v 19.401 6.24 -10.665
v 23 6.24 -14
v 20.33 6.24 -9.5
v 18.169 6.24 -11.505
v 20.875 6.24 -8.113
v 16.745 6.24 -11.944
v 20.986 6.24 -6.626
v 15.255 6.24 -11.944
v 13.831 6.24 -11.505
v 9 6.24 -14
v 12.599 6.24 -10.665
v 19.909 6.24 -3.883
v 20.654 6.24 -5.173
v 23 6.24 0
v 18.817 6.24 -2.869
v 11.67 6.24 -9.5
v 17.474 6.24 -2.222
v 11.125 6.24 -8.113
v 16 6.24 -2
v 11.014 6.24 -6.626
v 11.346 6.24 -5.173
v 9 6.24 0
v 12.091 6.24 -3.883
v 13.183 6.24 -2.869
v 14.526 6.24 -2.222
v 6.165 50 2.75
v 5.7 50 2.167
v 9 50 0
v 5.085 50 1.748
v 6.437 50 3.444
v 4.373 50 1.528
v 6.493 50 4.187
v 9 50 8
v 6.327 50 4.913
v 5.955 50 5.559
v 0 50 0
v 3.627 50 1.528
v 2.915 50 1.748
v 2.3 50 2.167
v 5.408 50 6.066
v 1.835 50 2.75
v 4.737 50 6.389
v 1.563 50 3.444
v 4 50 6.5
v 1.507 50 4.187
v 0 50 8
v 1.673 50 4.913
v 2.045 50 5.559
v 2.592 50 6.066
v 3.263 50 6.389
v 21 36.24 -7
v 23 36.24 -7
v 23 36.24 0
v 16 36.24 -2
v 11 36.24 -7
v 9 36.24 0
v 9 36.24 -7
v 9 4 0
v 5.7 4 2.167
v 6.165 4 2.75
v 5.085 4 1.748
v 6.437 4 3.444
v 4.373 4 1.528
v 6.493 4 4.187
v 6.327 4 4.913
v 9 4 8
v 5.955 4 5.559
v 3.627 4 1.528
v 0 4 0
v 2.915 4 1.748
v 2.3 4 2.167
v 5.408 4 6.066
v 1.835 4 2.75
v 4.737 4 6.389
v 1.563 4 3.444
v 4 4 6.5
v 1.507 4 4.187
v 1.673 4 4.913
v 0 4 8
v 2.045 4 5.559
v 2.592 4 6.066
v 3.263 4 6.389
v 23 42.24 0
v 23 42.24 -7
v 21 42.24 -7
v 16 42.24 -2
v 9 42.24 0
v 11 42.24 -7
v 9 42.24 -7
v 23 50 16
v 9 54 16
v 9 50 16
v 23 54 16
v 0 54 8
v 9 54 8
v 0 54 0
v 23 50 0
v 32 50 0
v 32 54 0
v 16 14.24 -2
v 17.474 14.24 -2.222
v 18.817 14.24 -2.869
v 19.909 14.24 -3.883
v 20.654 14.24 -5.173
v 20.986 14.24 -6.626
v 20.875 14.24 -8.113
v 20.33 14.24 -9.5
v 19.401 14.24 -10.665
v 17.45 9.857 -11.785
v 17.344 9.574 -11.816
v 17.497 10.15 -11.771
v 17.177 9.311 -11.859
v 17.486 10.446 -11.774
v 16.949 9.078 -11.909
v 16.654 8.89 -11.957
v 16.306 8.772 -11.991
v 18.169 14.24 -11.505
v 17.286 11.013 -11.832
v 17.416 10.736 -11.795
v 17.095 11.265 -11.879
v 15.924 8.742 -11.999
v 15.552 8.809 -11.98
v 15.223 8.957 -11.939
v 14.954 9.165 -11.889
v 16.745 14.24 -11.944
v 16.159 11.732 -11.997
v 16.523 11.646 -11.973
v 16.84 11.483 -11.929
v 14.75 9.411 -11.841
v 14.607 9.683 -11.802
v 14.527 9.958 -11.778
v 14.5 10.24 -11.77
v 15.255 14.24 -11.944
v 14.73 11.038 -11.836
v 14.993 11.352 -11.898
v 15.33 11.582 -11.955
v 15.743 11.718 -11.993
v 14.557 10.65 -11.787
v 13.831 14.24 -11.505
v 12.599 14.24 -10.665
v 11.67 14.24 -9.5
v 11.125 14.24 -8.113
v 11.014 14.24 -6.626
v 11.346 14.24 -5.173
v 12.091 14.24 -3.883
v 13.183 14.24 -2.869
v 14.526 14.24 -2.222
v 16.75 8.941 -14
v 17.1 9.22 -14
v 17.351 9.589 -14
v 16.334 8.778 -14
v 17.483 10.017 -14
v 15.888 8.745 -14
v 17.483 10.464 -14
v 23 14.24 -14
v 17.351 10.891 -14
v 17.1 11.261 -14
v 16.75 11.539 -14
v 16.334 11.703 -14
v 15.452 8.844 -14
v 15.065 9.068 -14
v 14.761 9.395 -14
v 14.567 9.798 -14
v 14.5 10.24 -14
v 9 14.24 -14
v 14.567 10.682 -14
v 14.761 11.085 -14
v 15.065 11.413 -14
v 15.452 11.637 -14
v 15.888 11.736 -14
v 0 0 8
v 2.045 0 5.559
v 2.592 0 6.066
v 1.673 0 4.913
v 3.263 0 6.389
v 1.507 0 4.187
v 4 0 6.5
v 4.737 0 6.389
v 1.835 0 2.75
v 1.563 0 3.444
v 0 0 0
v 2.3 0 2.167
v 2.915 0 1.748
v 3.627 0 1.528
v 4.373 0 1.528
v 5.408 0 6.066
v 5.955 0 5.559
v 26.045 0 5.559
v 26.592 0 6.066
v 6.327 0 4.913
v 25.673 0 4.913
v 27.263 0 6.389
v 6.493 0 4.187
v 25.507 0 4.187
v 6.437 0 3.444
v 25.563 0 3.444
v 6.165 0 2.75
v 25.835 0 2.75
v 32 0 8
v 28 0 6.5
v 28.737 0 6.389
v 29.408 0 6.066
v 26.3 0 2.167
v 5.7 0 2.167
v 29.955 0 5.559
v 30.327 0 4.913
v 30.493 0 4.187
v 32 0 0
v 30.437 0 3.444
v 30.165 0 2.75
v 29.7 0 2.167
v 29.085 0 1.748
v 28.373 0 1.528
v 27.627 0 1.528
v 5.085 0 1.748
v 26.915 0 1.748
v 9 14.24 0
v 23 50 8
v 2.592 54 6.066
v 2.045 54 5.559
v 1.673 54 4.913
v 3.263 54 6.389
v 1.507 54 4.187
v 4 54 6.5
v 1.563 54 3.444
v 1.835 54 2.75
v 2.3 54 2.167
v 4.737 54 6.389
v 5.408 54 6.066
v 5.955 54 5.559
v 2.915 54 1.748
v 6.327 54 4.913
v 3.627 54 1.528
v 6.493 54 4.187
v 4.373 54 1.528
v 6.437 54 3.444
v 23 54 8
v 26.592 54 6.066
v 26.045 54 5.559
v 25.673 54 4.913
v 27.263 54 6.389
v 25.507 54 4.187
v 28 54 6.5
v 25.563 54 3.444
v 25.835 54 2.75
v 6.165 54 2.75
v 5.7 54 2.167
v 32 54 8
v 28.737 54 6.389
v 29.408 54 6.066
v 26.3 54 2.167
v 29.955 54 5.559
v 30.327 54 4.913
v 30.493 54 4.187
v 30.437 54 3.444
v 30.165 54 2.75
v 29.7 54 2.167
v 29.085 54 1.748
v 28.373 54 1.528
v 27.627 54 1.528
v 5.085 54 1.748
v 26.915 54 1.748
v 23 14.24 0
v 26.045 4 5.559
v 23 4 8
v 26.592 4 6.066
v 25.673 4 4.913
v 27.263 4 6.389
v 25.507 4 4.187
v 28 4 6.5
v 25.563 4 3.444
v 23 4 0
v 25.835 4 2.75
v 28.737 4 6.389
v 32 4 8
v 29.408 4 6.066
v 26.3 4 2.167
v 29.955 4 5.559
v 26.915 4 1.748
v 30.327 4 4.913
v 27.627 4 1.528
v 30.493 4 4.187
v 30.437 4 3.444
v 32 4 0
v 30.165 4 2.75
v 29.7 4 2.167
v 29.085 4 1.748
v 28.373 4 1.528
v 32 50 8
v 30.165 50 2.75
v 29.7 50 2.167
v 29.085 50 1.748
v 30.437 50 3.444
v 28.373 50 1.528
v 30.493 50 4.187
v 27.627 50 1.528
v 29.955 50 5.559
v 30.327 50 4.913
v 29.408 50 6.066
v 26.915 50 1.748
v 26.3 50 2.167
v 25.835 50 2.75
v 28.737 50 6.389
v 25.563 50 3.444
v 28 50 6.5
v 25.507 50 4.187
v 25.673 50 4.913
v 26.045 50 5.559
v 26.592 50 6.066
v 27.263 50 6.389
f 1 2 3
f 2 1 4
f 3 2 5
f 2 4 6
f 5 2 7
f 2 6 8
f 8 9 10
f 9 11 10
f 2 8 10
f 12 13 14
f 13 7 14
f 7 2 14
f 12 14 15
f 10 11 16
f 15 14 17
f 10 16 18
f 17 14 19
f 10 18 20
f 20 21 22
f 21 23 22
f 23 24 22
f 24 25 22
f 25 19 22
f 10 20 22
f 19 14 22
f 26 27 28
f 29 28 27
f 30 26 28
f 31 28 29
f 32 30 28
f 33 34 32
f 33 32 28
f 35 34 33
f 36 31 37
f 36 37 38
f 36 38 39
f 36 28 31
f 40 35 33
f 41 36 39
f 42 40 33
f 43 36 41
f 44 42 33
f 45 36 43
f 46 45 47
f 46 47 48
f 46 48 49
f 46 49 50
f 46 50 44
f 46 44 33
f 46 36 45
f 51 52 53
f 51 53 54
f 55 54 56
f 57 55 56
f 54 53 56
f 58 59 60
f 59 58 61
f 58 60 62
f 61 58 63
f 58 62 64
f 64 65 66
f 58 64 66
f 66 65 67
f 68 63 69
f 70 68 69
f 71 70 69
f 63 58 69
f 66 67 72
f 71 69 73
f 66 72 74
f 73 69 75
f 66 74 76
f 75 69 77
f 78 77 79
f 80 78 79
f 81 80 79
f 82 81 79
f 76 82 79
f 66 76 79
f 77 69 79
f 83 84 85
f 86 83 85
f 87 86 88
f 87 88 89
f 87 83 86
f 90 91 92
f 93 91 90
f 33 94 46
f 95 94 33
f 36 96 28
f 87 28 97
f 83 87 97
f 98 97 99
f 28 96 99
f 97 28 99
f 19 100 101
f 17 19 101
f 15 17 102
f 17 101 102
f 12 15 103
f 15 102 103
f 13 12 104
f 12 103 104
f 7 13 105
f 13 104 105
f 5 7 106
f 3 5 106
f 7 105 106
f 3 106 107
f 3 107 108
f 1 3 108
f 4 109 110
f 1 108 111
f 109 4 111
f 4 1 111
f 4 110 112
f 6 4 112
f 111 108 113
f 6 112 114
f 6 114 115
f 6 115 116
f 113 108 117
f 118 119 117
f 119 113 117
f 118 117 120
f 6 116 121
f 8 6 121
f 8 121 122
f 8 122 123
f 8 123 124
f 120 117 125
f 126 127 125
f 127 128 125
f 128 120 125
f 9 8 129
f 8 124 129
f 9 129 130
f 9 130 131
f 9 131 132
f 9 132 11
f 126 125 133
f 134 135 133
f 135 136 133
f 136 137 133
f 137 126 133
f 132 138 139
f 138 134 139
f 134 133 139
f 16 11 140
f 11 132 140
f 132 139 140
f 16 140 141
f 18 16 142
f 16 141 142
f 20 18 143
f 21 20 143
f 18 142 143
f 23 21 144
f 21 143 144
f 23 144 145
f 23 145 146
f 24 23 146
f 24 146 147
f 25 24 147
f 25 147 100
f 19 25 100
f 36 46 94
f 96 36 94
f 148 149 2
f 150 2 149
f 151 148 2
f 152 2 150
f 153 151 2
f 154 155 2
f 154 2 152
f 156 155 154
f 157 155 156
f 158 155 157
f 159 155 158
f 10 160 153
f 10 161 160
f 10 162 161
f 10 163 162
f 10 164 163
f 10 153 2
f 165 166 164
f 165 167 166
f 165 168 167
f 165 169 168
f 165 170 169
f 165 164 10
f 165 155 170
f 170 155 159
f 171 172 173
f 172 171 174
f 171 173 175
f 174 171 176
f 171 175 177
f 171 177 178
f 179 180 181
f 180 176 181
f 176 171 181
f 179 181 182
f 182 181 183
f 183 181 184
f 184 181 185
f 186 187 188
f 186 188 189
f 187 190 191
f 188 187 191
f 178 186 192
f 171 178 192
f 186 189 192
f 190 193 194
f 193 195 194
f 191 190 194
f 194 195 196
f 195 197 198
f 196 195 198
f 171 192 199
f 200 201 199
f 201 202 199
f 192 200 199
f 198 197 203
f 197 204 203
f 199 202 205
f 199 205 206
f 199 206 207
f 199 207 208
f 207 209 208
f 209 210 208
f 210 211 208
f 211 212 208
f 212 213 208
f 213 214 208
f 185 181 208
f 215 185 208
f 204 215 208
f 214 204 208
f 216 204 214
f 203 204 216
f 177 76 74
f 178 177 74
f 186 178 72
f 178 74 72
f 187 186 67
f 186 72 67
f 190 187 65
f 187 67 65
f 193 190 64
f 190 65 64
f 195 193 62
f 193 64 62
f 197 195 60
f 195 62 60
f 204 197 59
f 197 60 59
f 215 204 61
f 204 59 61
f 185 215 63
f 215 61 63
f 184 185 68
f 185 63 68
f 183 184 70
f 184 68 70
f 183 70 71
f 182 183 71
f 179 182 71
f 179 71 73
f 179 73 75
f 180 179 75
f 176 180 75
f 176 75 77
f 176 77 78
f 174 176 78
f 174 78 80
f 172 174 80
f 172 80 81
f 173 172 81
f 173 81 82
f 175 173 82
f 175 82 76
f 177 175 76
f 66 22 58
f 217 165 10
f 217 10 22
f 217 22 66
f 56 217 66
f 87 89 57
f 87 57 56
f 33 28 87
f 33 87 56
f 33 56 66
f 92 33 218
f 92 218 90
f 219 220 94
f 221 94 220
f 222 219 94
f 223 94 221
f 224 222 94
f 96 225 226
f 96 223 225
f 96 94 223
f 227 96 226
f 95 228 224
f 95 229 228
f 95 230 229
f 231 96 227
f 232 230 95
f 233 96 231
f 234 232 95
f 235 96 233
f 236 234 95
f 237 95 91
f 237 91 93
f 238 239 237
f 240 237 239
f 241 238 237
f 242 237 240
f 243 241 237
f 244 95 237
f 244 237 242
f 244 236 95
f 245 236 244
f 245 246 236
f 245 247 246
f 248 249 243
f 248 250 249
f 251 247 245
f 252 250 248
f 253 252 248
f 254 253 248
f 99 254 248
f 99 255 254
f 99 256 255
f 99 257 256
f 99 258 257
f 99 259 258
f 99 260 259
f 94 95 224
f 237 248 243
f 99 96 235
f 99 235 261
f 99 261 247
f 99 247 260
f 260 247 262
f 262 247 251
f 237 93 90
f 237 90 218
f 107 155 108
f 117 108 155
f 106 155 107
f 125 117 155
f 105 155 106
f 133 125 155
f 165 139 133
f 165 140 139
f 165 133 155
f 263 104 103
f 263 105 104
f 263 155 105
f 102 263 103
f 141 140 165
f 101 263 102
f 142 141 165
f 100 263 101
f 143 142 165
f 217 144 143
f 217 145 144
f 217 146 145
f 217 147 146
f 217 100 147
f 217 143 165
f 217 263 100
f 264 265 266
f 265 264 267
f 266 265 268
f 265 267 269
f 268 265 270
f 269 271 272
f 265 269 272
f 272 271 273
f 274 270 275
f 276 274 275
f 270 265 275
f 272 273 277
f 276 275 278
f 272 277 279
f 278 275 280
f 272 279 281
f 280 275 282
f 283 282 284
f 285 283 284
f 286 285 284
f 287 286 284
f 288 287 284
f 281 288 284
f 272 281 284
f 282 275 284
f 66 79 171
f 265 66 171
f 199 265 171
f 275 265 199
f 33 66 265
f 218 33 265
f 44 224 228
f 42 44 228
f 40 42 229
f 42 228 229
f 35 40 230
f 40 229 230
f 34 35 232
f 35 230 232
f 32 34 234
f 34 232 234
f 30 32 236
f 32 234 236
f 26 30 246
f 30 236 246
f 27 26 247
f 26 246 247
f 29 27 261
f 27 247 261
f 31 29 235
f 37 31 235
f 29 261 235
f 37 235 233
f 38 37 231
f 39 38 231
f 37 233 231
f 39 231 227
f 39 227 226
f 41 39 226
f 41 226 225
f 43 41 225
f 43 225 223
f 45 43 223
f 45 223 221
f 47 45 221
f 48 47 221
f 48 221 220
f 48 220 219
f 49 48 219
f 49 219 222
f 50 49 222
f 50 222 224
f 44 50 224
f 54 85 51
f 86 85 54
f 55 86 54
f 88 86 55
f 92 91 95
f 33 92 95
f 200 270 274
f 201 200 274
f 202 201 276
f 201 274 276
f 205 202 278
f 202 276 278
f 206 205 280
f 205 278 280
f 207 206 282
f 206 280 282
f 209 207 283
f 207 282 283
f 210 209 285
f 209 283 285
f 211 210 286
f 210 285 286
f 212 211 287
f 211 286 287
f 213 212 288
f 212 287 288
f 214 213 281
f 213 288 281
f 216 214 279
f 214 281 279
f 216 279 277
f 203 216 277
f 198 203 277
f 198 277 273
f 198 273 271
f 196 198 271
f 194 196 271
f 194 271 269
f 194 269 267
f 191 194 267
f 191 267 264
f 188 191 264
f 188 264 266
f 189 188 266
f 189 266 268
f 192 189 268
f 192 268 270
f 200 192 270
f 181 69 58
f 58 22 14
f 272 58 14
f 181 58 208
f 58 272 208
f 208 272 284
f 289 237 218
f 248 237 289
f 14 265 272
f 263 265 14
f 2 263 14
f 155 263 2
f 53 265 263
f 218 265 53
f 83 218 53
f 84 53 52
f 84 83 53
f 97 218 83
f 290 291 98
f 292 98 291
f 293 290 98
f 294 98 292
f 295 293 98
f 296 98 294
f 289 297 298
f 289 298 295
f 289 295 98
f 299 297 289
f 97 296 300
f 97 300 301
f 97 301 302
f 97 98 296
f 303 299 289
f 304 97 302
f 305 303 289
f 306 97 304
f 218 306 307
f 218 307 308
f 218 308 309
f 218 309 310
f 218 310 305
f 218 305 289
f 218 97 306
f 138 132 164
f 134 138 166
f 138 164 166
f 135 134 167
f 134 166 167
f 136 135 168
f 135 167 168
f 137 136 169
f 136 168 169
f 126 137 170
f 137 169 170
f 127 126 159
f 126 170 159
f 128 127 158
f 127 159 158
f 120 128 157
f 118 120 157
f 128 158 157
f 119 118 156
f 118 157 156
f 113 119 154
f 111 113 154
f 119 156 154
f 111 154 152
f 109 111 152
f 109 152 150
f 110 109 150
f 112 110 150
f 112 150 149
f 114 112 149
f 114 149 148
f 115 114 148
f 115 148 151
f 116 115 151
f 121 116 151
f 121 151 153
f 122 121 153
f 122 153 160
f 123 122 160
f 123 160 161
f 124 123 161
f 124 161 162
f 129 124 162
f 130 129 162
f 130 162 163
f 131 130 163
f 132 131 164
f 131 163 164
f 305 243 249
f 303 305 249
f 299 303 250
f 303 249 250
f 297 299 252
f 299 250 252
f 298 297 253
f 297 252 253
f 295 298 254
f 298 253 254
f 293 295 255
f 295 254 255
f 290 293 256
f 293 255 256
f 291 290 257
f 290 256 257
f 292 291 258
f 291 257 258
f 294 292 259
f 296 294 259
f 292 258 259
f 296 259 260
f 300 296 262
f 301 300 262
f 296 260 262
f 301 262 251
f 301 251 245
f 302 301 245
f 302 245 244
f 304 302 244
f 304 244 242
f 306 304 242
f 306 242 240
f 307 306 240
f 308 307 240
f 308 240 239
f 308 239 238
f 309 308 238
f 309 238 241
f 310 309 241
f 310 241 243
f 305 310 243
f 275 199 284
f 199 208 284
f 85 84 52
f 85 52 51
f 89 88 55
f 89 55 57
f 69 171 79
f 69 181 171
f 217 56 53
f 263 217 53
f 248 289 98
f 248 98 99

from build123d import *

# Parameters (mm, degrees)
ESQUISSE1_W             = 32
ESQUISSE1_H             = 54
BOSS_EXTRU_1_DEPTH      = 8
ESQUISSE2_W             = 32
ESQUISSE2_H             = 4
BOSS_EXTRU_2_DEPTH      = 10
ESQUISSE3_W             = 8
ESQUISSE3_H             = 46
ENL_V_MAT_EXTRU_1_DEPTH = 9
ESQUISSE4_W             = 8
ESQUISSE4_H             = 46
ENL_V_MAT_EXTRU_2_DEPTH = 9
ESQUISSE5_R             = 2.5
ENL_V_MAT_EXTRU_3_DEPTH = 54
ESQUISSE6_W             = 14
ESQUISSE6_H             = 8
BOSS_EXTRU_3_DEPTH      = 14
ESQUISSE9_W             = 9
ESQUISSE9_H             = 10
ENL_V_MAT_EXTRU_6_DEPTH = 4
ESQUISSE10_W            = 14
ESQUISSE10_H            = 6
BOSS_EXTRU_4_DEPTH      = 7
ESQUISSE7_R             = 5
ENL_V_MAT_EXTRU_4_DEPTH = 55.118693403
ESQUISSE8_R             = 1.5
ENL_V_MAT_EXTRU_5_DEPTH = 7
ENL_V_MAT_EXTRU_7_DEPTH = 6
ESQUISSE12_W            = 14
ESQUISSE12_H            = 2
ENL_V_MAT_EXTRU_8_DEPTH = 66.299310869


with BuildPart() as part:
    # Esquisse1 → Boss.-Extru.1 (new body)
    with BuildSketch(Plane.XY):
        with Locations((16, 27)):
            Rectangle(ESQUISSE1_W, ESQUISSE1_H)
    extrude(amount=BOSS_EXTRU_1_DEPTH)

    # Esquisse2 → Boss.-Extru.2 (add)
    with BuildSketch(Plane.XY.offset(8)):
        with Locations((16, 52)):
            Rectangle(ESQUISSE2_W, ESQUISSE2_H)
    extrude(amount=BOSS_EXTRU_2_DEPTH)

    # Esquisse3 → Enlèv. mat.-Extru.1 (cut)
    with BuildSketch(Plane(origin=(32, 0, 0), x_dir=(0, 0, -1), z_dir=(1, 0, 0))):
        with Locations((-4, 27)):
            Rectangle(ESQUISSE3_W, ESQUISSE3_H)
    extrude(amount=-ENL_V_MAT_EXTRU_1_DEPTH, mode=Mode.SUBTRACT)

    # Esquisse4 → Enlèv. mat.-Extru.2 (cut)
    with BuildSketch(Plane.ZY):
        with Locations((4, 27)):
            Rectangle(ESQUISSE4_W, ESQUISSE4_H)
    extrude(amount=-ENL_V_MAT_EXTRU_2_DEPTH, mode=Mode.SUBTRACT)

    # Esquisse5 → Enlèv. mat.-Extru.3 (cut)
    with BuildSketch(Plane(origin=(0, 54, 0), x_dir=(1, 0, 0), z_dir=(0, 1, 0))):
        with Locations(Location((4, -4, 0), (0, 0, 270))):
            Circle(ESQUISSE5_R)
        with Locations(Location((28, -4, 0), (0, 0, 270))):
            Circle(ESQUISSE5_R)
    extrude(amount=-ENL_V_MAT_EXTRU_3_DEPTH, mode=Mode.SUBTRACT)

    # Esquisse6 → Boss.-Extru.3 (add)
    with BuildSketch(Plane(origin=(0, 0, 0), x_dir=(-1, 0, 0), z_dir=(0, 0, -1))):
        with Locations((-16, 10.240309664)):
            Rectangle(ESQUISSE6_W, ESQUISSE6_H)
    extrude(amount=BOSS_EXTRU_3_DEPTH)

    # Esquisse9 → Enlèv. mat.-Extru.6 (cut)
    with BuildSketch(Plane(origin=(0, 54, 0), x_dir=(1, 0, 0), z_dir=(0, 1, 0))):
        with Locations((27.5, -13)):
            Rectangle(ESQUISSE9_W, ESQUISSE9_H)
        with Locations((4.5, -13)):
            Rectangle(ESQUISSE9_W, ESQUISSE9_H)
    extrude(amount=-ENL_V_MAT_EXTRU_6_DEPTH, mode=Mode.SUBTRACT)

    # Esquisse10 → Boss.-Extru.4 (add)
    with BuildSketch(Plane(origin=(0, 0, 0), x_dir=(-1, 0, 0), z_dir=(0, 0, -1))):
        with Locations((-16, 39.240309664)):
            Rectangle(ESQUISSE10_W, ESQUISSE10_H)
    extrude(amount=BOSS_EXTRU_4_DEPTH)

    # Esquisse7 → Enlèv. mat.-Extru.4 (cut, through all)
    with BuildSketch(Plane(origin=(0, 14.240309664, 0), x_dir=(1, 0, 0), z_dir=(0, 1, 0))):
        with Locations(Location((16, 7, 0), (0, 0, 270))):
            Circle(ESQUISSE7_R)
    extrude(amount=-ENL_V_MAT_EXTRU_4_DEPTH, mode=Mode.SUBTRACT)

    # Esquisse8 → Enlèv. mat.-Extru.5 (cut)
    with BuildSketch(Plane(origin=(0, 0, -14), x_dir=(-1, 0, 0), z_dir=(0, 0, -1))):
        with Locations((-16, 10.240309664)):
            Circle(ESQUISSE8_R)
    extrude(amount=-ENL_V_MAT_EXTRU_5_DEPTH, mode=Mode.SUBTRACT)

    # Esquisse11 → Enlèv. mat.-Extru.7 (cut)
    with BuildSketch(Plane(origin=(0, 42.240309664, 0), x_dir=(1, 0, 0), z_dir=(0, 1, 0))):
        Polygon((21, 7), (16, 2), (11, 7), align=None)
    extrude(amount=-ENL_V_MAT_EXTRU_7_DEPTH, mode=Mode.SUBTRACT)

    # Esquisse12 → Enlèv. mat.-Extru.8 (cut, through all)
    with BuildSketch(Plane(origin=(0, 54, 0), x_dir=(1, 0, 0), z_dir=(0, 1, 0))):
        with Locations((16, -17)):
            Rectangle(ESQUISSE12_W, ESQUISSE12_H)
    extrude(amount=-ENL_V_MAT_EXTRU_8_DEPTH, mode=Mode.SUBTRACT)


solid = part.part
